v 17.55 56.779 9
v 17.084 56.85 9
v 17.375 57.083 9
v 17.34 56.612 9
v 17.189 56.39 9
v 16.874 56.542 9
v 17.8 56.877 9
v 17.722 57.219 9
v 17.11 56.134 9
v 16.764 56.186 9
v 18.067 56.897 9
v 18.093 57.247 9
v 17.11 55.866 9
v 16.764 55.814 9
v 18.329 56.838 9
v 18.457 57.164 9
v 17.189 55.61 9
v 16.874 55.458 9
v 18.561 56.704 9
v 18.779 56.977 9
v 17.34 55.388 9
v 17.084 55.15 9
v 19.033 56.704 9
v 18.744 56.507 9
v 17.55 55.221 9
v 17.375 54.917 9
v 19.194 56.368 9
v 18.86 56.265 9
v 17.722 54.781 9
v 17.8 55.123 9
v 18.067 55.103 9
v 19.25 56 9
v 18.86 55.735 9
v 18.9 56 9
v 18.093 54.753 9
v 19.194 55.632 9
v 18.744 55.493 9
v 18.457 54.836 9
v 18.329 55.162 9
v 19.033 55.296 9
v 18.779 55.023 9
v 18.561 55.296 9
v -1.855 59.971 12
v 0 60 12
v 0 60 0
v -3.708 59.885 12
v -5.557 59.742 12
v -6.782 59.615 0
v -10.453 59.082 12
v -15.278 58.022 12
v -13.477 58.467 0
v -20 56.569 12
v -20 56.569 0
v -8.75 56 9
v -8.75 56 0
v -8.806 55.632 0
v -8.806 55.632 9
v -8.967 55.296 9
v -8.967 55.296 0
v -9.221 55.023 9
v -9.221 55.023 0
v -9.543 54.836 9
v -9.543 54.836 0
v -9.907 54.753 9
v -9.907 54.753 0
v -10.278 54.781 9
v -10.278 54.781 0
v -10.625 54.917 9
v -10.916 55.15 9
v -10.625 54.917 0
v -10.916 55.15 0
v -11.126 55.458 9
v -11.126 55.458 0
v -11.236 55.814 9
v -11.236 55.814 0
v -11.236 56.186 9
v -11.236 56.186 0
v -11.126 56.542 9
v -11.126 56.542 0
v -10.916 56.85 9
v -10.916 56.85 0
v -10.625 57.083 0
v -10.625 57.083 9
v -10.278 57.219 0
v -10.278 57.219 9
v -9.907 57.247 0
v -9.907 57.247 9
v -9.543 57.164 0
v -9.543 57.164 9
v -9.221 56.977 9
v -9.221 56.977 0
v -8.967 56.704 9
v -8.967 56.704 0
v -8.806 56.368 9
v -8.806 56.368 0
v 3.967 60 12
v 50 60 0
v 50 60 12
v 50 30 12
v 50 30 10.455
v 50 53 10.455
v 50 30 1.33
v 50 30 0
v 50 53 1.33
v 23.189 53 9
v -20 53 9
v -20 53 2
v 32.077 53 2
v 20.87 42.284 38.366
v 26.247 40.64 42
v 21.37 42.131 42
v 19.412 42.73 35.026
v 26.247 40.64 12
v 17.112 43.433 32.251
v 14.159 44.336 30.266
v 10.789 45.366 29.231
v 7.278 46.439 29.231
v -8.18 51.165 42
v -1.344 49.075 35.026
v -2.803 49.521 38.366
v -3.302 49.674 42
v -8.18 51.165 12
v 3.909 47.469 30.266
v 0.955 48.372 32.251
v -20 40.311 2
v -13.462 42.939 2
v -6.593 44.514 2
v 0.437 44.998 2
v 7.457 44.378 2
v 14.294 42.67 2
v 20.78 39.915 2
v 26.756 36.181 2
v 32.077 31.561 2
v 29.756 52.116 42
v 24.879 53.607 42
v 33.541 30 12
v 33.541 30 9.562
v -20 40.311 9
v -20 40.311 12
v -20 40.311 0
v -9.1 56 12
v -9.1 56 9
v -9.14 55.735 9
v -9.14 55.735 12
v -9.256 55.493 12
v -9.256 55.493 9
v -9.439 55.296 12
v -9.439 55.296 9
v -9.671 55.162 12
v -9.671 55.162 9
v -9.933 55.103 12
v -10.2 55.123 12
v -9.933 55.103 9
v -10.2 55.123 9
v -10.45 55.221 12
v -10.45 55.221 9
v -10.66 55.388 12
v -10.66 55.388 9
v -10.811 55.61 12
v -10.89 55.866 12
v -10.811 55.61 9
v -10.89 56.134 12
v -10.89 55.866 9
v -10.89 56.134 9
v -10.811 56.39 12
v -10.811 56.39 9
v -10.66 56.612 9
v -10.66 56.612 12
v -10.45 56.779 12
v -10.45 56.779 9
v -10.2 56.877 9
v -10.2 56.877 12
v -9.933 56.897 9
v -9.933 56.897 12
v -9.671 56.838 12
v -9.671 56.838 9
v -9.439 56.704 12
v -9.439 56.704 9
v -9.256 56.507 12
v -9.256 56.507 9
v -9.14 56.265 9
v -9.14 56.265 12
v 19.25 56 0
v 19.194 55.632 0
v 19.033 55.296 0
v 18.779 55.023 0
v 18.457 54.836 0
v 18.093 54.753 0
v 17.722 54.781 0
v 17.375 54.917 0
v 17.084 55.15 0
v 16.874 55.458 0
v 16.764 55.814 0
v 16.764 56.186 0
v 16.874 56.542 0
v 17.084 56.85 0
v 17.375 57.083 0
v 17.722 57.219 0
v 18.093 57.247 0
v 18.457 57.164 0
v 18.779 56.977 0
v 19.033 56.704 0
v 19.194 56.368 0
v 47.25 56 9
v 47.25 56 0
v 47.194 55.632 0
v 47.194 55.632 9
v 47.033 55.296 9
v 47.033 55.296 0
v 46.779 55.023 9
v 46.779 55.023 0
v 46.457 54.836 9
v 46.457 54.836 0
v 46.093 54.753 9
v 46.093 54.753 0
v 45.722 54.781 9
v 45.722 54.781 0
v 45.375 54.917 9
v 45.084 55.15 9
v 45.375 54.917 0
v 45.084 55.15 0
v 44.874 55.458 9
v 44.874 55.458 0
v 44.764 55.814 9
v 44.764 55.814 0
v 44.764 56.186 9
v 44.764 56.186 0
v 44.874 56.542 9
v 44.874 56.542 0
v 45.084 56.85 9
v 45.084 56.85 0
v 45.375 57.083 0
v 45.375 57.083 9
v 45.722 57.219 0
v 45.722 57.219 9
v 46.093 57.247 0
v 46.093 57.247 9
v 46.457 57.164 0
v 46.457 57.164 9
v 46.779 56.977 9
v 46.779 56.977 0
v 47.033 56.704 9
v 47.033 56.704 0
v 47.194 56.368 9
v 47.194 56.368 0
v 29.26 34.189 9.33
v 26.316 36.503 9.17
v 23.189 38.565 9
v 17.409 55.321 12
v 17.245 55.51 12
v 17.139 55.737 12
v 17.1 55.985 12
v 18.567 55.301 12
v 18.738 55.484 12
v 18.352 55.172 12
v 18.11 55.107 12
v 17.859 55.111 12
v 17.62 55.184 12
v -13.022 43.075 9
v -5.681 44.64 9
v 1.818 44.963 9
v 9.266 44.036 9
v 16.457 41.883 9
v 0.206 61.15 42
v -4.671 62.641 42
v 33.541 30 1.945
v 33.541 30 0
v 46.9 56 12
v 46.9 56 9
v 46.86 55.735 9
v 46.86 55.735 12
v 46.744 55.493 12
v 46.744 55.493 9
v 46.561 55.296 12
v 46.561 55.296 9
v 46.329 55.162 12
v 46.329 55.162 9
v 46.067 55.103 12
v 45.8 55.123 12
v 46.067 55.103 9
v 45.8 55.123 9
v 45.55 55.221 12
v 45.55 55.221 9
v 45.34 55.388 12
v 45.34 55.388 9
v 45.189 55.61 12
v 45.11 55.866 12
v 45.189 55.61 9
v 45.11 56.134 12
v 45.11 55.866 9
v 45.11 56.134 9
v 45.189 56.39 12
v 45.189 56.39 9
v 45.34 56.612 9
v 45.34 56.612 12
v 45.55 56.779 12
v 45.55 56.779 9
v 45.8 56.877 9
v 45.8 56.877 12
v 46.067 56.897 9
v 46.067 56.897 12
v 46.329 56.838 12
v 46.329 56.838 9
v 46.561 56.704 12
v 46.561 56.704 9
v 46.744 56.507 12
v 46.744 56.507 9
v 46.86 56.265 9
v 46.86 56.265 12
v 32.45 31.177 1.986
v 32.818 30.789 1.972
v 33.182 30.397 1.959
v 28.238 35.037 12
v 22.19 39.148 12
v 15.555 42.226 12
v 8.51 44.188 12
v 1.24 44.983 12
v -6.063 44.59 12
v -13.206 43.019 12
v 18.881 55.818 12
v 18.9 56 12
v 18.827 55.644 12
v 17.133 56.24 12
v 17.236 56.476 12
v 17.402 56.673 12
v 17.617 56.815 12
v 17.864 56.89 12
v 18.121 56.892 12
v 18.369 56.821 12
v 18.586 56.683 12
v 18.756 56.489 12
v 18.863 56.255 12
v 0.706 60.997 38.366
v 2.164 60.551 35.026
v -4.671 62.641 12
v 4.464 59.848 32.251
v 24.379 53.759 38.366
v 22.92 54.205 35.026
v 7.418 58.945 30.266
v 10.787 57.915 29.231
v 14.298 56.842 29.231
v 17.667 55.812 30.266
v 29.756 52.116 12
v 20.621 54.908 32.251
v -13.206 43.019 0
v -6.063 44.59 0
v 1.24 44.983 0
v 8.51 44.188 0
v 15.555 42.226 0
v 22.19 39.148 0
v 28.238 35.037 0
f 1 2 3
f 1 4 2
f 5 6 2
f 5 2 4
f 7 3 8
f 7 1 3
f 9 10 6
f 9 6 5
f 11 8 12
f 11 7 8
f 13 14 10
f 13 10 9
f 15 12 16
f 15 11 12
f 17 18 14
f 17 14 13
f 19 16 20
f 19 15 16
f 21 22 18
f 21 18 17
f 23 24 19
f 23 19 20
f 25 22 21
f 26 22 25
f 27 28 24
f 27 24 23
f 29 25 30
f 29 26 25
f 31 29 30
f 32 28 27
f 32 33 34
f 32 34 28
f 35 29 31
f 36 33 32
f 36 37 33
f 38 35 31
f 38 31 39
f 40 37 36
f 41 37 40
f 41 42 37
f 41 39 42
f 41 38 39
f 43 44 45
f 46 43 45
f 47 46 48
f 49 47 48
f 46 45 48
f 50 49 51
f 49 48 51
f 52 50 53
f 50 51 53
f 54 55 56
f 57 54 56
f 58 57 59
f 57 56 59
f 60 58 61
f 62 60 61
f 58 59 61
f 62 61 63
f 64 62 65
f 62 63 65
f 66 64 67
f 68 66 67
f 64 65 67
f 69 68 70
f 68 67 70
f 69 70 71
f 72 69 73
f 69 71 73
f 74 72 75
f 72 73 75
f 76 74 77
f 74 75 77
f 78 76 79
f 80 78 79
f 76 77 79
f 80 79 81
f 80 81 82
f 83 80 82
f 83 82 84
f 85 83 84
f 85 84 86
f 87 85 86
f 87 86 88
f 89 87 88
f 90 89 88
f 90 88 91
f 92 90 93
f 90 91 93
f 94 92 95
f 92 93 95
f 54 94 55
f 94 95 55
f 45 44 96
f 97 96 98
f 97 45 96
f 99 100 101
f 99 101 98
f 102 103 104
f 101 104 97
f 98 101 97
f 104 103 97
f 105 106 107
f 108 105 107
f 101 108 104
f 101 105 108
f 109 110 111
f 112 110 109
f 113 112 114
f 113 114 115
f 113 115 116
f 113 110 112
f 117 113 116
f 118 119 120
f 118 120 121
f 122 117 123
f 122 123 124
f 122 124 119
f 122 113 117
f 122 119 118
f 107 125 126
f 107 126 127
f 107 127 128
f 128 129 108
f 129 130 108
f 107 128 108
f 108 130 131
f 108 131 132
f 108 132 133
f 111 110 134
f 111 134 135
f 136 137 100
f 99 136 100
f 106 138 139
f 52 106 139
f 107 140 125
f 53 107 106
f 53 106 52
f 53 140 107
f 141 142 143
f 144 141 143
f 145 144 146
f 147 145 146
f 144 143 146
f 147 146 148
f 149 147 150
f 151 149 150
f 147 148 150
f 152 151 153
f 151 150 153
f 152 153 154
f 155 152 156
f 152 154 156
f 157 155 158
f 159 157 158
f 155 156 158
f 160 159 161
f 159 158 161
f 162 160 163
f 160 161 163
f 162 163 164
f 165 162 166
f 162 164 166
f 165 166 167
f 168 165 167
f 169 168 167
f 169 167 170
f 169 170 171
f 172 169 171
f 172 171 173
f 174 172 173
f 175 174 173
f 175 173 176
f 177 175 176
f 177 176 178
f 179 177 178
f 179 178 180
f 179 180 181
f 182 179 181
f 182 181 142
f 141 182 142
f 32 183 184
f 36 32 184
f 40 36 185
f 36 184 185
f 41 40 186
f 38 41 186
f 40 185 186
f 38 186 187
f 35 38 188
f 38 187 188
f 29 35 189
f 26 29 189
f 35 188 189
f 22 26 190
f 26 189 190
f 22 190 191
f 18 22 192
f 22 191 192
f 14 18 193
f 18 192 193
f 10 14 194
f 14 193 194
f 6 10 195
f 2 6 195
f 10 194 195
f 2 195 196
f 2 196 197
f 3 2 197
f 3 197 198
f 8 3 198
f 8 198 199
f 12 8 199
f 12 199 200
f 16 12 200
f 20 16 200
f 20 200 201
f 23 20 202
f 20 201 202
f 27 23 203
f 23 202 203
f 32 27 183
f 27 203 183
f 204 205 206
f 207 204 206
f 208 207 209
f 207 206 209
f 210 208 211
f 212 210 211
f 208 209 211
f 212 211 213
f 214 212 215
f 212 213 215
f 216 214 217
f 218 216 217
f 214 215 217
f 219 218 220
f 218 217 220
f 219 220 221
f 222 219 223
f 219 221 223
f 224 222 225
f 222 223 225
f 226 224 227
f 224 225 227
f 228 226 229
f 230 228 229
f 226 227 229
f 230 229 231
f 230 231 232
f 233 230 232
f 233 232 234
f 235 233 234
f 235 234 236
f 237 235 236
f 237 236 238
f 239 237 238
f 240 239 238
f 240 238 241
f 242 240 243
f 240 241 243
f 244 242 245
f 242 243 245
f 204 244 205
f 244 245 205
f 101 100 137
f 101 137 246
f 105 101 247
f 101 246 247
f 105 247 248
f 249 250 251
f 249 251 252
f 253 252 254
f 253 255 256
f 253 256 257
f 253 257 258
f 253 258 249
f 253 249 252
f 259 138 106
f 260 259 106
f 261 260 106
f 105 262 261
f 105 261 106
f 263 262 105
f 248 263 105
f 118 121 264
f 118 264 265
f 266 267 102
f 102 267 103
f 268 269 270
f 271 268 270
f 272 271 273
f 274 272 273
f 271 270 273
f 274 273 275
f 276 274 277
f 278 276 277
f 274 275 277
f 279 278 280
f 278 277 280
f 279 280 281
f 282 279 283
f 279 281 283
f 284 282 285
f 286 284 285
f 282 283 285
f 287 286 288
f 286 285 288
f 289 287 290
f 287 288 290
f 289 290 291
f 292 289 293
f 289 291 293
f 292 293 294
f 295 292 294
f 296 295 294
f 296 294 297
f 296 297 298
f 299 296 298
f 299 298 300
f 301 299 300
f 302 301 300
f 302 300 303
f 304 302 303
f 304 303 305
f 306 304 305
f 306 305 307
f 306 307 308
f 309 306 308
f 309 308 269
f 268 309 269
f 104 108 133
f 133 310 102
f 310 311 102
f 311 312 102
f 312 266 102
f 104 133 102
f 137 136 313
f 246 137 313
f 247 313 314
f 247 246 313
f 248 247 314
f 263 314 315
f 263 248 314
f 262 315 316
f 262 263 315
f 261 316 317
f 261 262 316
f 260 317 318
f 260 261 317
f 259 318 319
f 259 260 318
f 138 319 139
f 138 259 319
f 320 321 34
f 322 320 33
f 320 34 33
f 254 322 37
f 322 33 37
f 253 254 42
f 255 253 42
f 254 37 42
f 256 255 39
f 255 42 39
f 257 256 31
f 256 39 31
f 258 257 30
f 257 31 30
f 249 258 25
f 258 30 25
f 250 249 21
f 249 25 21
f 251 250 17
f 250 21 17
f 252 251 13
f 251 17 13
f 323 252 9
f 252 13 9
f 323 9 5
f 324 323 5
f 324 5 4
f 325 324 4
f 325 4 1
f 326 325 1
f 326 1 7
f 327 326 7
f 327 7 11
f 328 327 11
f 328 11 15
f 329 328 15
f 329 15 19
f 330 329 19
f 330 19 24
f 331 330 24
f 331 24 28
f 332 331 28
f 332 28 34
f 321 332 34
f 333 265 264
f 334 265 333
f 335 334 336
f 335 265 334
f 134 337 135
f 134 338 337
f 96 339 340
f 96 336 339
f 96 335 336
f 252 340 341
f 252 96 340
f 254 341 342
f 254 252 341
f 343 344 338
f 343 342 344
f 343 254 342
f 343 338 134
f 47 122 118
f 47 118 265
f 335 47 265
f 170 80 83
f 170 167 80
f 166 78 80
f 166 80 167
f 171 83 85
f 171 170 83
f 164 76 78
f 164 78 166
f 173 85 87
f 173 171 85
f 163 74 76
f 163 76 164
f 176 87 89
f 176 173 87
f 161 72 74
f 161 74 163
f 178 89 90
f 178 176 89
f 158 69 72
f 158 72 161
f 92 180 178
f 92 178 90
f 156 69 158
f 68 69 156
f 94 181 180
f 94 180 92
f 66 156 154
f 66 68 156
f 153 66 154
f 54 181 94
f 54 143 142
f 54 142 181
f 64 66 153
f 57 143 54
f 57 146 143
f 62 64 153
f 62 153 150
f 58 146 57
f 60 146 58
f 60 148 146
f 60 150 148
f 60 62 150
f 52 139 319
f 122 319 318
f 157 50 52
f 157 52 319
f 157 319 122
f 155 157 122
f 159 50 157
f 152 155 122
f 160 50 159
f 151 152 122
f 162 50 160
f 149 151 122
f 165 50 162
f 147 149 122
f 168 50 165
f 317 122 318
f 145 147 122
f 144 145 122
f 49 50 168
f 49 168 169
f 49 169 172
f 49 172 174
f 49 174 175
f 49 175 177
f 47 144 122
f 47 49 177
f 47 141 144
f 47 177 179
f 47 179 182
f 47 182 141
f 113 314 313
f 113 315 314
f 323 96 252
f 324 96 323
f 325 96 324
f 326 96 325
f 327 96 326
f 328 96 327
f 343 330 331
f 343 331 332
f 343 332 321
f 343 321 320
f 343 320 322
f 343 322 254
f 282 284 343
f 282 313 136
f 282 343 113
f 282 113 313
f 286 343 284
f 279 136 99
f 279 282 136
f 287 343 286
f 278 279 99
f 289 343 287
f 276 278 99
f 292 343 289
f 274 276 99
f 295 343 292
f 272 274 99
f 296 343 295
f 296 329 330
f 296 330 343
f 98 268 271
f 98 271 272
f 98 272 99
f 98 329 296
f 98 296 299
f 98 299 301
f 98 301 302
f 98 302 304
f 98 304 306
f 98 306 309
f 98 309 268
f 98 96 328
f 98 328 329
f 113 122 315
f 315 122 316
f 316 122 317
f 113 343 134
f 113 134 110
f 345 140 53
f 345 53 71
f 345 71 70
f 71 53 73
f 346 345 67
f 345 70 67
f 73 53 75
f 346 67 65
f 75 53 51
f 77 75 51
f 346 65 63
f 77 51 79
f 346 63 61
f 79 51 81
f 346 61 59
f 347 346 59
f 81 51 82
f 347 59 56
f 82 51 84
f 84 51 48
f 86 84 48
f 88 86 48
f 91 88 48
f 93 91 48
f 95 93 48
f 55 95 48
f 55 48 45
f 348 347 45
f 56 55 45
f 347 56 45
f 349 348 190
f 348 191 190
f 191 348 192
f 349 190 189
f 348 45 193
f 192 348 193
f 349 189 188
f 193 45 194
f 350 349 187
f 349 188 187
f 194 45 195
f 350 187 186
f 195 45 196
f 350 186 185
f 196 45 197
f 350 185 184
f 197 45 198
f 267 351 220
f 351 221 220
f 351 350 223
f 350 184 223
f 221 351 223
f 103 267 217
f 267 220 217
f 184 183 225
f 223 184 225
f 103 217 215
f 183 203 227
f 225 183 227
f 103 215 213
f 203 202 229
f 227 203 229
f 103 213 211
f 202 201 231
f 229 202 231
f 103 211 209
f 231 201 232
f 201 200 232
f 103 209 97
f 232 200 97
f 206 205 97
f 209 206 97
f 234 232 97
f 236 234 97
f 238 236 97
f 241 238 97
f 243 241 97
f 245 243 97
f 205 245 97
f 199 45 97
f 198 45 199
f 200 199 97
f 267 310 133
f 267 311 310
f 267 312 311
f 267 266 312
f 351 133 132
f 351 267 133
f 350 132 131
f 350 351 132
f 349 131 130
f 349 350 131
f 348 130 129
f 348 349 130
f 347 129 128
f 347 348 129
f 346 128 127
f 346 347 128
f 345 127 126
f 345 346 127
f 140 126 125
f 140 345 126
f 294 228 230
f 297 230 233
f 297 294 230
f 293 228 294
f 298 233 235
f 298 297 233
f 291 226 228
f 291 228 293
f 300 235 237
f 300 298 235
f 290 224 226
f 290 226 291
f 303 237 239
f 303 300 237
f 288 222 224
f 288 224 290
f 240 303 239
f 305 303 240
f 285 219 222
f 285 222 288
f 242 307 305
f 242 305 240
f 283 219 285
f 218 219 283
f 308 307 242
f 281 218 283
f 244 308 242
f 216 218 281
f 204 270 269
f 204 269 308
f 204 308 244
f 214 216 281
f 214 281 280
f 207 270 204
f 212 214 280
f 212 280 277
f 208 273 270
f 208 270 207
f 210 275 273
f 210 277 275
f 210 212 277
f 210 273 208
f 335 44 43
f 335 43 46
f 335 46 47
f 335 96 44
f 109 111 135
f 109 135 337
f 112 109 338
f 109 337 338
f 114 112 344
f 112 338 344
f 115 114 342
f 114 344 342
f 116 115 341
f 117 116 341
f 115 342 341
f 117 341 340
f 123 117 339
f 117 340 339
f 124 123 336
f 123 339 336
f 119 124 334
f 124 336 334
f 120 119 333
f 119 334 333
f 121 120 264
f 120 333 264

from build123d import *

# Parameters (mm, degrees)
PAD_DEPTH       = 12
PAD001_DEPTH    = 30
SKETCH002_R     = 12.9
POCKET_DEPTH    = 35.6974328919
SKETCH003_W     = 100
SKETCH003_H     = 7
POCKET001_DEPTH = 23
SKETCH004_R     = 0.9
POCKET002_DEPTH = 12
SKETCH005_R     = 1.25
POCKET003_DEPTH = 9
POCKET004_DEPTH = 23


with BuildPart() as part:
    # Sketch → Pad (new body)
    with BuildSketch(Plane.XY):
        with BuildLine():
            Line((33.5410196625, 30), (50, 30))
            Line((50, 30), (50, 60))
            Line((0, 60), (50, 60))
            ThreePointArc((0, 60), (-10.1461187235, 59.1359135792), (-20, 56.5685424949))
            Line((-20, 40.3112887415), (-20, 56.5685424949))
            ThreePointArc((33.5410196625, 30), (8.5100218715, 44.1880020792), (-20, 40.3112887415))
        make_face()
    extrude(amount=PAD_DEPTH)

    # Sketch001 → Pad001 (new body)
    with BuildSketch(Plane.XY.offset(12)):
        Polygon((-4.671183324, 62.6409760428), (29.7557878907, 52.1155946728), (26.247327434, 40.6399376012), (-8.1796437806, 51.1653189712), align=None)
    extrude(amount=PAD001_DEPTH)

    # Sketch002 → Pocket (cut, through all)
    with BuildSketch(Plane(origin=(17.1148962148, 55.9803030991, 0), x_dir=(-0.956304756, 0.2923717047, 0), z_dir=(0.2923717047, 0.956304756, 0))):
        with Locations((4.7815237798, 42)):
            Circle(SKETCH002_R)
    extrude(amount=-POCKET_DEPTH, mode=Mode.SUBTRACT)

    # Sketch003 → Pocket001 (cut)
    with BuildSketch(Plane.XZ.offset(-30)):
        with Locations((11.7941241648, 5.5)):
            Rectangle(SKETCH003_W, SKETCH003_H)
    extrude(amount=-POCKET001_DEPTH, mode=Mode.SUBTRACT)

    # Sketch004 → Pocket002 (cut)
    with BuildSketch(Plane(origin=(0, 0, 0), x_dir=(1, 0, 0), z_dir=(0, 0, -1))):
        with Locations((-10, -56)):
            Circle(SKETCH004_R)
        with Locations((18, -56)):
            Circle(SKETCH004_R)
        with Locations((46, -56)):
            Circle(SKETCH004_R)
    extrude(amount=-POCKET002_DEPTH, mode=Mode.SUBTRACT)

    # Sketch005 → Pocket003 (cut)
    with BuildSketch(Plane(origin=(0, 0, 0), x_dir=(1, 0, 0), z_dir=(0, 0, -1))):
        with Locations((18, -56)):
            Circle(SKETCH005_R)
        with Locations((-10, -56)):
            Circle(SKETCH005_R)
        with Locations((46, -56)):
            Circle(SKETCH005_R)
    extrude(amount=-POCKET003_DEPTH, mode=Mode.SUBTRACT)

    # Sketch006 → Pocket004 (cut)
    with BuildSketch(Plane.XZ.offset(-30)):
        Polygon((71.676384, 11.631999), (1.884626, 7.843544), (1.884626, 3.12902), (71.676384, 0.519198), align=None)
    extrude(amount=-POCKET004_DEPTH, mode=Mode.SUBTRACT)


solid = part.part
